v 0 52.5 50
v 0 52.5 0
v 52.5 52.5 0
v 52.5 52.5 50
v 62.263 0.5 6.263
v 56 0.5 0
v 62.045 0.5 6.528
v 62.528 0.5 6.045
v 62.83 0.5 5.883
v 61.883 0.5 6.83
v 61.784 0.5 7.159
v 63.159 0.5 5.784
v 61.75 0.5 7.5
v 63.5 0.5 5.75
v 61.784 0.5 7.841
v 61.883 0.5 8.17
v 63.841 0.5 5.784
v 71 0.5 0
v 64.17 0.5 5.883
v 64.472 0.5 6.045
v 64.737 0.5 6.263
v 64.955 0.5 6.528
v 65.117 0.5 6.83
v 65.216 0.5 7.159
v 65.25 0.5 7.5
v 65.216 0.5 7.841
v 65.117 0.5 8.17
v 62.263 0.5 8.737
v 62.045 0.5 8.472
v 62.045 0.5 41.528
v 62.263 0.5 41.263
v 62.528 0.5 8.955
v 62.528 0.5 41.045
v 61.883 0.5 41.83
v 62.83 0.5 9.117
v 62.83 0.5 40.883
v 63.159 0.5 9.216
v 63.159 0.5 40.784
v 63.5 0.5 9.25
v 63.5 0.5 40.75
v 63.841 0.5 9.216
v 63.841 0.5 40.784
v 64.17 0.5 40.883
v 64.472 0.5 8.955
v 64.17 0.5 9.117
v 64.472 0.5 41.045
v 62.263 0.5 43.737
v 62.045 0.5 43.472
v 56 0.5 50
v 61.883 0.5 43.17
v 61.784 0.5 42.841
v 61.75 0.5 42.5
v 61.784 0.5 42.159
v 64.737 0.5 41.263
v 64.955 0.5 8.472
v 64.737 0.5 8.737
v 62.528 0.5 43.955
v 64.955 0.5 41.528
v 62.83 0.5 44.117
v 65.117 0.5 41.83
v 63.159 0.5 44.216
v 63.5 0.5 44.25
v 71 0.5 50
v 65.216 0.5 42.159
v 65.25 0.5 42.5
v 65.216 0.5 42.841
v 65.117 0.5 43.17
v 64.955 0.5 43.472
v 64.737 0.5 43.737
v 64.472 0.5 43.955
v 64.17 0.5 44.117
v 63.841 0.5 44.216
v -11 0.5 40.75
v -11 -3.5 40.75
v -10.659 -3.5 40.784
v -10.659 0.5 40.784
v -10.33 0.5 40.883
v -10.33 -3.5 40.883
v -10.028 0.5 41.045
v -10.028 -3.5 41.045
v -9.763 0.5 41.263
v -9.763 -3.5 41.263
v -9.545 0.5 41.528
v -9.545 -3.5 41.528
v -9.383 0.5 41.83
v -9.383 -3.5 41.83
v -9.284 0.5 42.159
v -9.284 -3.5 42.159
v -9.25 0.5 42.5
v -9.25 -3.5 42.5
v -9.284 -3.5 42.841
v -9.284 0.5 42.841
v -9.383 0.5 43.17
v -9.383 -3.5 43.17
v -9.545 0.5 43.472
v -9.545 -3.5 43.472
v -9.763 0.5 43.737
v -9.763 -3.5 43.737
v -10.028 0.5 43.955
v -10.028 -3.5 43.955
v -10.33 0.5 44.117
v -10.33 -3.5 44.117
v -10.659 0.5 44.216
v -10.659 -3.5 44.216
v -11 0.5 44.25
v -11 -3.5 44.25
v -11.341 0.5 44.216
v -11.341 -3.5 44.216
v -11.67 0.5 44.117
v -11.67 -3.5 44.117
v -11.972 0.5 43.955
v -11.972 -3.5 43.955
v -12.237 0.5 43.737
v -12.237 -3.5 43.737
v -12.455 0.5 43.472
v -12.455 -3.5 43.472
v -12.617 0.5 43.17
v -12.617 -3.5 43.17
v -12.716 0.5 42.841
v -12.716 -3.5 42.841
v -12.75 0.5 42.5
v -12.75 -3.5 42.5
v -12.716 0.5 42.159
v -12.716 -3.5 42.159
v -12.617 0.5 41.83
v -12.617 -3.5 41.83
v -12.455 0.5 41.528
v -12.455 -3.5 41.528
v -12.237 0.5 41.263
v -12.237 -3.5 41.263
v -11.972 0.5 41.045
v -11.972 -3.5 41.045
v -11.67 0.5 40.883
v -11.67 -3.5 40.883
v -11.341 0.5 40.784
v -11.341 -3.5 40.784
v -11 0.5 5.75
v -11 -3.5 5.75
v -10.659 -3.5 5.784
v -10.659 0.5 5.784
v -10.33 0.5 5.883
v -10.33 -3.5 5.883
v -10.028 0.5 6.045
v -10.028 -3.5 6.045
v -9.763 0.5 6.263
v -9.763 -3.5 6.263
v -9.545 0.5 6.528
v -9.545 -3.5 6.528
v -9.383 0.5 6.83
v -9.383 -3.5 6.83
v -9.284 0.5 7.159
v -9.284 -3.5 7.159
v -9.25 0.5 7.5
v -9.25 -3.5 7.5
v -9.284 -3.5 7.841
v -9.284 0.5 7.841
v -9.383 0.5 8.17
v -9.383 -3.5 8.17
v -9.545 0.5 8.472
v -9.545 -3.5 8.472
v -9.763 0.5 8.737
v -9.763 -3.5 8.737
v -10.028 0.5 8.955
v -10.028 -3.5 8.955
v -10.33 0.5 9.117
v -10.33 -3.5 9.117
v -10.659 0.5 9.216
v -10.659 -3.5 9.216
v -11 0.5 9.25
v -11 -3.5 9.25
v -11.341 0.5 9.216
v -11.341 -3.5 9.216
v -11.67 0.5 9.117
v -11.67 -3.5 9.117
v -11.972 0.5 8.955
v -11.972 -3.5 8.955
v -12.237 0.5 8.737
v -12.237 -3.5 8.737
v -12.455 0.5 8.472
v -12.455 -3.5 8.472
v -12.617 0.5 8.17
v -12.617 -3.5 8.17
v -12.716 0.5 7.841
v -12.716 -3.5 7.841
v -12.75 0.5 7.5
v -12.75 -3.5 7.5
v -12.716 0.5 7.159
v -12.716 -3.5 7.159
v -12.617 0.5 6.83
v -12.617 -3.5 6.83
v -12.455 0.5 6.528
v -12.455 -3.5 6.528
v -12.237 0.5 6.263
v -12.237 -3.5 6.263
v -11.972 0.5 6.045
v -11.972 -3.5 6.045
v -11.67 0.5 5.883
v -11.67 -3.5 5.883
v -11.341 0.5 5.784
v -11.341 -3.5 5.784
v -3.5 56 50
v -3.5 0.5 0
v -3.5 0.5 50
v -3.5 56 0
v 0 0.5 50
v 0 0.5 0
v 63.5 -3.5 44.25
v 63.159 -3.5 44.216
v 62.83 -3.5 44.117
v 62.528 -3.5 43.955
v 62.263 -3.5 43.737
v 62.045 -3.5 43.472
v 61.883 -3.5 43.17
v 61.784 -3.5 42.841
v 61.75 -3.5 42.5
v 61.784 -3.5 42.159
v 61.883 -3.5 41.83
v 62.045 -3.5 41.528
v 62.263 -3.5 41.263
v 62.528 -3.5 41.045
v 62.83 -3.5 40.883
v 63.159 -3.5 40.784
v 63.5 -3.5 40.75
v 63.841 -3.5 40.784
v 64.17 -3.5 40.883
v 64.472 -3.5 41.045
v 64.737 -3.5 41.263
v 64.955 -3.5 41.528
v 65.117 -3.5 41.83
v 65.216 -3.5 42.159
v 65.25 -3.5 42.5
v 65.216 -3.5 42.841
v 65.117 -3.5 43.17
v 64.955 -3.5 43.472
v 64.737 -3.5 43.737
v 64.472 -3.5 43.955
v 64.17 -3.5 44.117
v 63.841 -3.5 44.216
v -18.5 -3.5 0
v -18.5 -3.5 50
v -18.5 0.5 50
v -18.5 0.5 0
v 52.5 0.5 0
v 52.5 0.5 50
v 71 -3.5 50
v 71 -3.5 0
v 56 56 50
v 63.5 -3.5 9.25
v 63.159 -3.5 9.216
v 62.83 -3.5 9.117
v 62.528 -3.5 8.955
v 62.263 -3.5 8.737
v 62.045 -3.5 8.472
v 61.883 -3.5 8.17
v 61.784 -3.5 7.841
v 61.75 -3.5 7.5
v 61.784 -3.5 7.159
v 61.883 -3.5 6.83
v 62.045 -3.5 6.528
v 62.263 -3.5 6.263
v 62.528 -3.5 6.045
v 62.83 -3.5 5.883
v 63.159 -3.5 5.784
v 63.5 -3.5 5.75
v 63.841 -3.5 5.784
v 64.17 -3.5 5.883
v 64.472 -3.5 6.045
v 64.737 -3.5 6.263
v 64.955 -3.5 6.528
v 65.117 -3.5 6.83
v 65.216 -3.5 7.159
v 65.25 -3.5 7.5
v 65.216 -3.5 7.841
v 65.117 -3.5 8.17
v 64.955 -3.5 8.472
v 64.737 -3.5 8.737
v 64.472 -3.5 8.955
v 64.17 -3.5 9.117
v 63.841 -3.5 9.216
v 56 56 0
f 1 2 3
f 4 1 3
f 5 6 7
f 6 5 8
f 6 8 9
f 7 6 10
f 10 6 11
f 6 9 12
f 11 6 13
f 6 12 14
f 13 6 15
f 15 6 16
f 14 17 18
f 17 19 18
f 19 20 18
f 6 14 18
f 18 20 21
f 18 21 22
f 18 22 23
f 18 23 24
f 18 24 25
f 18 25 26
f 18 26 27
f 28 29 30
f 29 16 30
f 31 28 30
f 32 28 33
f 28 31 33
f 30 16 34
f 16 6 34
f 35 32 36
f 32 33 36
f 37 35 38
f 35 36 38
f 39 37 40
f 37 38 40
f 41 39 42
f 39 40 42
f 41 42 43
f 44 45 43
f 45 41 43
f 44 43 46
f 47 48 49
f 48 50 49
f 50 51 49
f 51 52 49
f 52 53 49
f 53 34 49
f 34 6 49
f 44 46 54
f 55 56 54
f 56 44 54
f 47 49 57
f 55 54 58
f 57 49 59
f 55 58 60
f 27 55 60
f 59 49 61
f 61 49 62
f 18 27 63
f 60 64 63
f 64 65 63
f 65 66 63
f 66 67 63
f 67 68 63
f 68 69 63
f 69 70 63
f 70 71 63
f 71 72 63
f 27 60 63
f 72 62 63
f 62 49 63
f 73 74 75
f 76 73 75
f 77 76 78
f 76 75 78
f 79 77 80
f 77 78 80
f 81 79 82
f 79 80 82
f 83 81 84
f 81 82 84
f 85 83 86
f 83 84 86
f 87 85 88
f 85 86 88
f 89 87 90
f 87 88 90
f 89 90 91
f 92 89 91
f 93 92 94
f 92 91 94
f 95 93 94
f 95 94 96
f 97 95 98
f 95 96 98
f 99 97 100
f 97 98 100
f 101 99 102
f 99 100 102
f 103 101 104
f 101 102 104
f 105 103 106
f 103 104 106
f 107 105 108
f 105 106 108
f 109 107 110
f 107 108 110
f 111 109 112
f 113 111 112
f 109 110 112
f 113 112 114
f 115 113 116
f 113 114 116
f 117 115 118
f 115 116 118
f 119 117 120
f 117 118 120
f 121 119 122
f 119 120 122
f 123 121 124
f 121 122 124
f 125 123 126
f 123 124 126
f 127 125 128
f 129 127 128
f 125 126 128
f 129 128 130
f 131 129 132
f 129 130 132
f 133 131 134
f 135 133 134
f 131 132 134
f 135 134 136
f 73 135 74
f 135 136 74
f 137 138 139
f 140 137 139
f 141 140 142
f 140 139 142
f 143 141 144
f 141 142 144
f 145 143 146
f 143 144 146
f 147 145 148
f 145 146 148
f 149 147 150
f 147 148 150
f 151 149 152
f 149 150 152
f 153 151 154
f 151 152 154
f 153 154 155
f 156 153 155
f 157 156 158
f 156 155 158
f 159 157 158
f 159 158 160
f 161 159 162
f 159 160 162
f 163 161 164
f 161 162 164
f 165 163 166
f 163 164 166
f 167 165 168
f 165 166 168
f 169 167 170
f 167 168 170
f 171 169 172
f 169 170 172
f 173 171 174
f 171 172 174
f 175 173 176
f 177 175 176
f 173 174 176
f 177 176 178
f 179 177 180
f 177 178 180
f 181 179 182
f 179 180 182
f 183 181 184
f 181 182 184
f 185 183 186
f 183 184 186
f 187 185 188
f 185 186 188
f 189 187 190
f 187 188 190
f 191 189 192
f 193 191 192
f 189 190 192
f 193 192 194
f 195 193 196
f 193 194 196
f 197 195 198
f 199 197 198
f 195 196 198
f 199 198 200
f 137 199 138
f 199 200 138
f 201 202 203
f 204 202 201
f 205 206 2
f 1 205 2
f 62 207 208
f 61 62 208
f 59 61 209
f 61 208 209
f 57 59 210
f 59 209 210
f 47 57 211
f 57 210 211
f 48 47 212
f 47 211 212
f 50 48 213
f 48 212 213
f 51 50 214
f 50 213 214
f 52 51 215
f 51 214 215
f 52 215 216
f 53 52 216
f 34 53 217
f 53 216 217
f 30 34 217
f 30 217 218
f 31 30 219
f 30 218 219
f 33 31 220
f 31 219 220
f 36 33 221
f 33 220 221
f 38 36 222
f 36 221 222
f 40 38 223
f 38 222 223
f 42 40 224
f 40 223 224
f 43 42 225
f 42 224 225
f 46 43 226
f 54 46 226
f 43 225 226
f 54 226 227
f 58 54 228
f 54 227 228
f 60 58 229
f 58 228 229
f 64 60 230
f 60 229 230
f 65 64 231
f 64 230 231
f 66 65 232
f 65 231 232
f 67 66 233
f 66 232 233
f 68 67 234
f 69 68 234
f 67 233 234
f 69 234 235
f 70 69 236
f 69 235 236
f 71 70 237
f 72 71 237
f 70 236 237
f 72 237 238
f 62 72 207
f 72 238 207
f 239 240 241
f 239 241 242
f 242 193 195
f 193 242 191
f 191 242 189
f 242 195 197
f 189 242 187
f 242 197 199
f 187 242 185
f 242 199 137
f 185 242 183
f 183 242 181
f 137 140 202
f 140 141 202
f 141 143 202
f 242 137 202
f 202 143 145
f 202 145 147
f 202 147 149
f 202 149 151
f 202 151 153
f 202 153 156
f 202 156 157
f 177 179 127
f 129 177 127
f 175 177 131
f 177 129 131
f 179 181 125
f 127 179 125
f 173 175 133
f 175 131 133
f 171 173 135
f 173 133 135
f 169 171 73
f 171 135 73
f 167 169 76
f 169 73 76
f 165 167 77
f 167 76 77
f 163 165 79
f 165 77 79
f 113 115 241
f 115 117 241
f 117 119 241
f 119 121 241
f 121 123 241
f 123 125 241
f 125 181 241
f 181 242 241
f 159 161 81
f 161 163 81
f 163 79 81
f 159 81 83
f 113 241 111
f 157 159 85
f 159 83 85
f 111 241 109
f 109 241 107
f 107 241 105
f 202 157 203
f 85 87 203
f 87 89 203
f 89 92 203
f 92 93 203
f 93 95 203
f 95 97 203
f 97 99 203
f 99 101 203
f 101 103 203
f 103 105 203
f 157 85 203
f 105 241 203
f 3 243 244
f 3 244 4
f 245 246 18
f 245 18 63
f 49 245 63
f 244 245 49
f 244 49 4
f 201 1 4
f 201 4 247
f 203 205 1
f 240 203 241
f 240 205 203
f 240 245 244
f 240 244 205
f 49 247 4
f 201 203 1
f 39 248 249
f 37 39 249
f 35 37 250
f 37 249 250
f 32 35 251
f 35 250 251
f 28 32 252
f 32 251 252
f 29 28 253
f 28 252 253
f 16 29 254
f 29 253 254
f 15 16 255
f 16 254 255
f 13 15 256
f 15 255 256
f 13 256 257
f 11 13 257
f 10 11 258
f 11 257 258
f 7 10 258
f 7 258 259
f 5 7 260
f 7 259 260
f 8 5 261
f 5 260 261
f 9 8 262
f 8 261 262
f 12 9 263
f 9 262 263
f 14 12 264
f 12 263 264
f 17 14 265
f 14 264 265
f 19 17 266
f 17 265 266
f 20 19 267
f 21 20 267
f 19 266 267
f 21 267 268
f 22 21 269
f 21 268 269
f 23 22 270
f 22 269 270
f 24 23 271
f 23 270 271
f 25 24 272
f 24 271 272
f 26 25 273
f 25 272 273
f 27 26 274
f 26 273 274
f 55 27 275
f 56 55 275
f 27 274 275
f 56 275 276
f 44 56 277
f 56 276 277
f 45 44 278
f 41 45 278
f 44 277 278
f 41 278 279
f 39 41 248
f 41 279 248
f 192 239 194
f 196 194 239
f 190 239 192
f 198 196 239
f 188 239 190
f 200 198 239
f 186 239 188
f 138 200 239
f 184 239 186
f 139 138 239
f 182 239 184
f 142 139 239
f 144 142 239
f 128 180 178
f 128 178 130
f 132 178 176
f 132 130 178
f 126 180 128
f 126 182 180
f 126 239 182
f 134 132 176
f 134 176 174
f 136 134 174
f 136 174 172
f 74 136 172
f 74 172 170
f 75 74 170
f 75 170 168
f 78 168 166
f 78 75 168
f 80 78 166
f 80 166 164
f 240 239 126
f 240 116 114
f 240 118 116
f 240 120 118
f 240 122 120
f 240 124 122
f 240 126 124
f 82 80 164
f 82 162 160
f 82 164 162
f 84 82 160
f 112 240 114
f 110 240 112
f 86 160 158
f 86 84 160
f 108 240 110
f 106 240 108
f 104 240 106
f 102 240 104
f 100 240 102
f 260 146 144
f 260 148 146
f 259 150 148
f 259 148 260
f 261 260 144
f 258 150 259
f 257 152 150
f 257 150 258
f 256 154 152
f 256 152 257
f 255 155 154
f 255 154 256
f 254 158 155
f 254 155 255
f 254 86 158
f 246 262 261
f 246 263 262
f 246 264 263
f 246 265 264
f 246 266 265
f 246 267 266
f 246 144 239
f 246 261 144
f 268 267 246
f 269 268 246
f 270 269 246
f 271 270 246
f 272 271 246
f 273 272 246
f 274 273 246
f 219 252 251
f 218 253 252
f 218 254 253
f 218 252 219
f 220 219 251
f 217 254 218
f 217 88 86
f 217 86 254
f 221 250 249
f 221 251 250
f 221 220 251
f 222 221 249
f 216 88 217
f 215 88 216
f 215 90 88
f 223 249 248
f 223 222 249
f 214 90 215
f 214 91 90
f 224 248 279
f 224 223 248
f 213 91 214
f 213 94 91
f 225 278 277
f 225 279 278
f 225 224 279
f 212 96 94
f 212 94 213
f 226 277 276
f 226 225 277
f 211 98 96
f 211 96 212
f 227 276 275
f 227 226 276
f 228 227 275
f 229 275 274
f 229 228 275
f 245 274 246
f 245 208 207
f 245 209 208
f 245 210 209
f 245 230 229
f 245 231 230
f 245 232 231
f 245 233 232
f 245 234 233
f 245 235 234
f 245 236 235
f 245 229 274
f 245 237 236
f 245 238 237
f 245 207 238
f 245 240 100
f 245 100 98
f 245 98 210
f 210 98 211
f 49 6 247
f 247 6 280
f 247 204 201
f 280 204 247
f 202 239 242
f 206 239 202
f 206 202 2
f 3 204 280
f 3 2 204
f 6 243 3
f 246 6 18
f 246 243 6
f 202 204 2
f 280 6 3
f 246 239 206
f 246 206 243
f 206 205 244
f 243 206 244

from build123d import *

# Parameters (mm, degrees)
SKETCH5_W           = 59.5
SKETCH5_H           = 59.5
SKETCH5_W_2         = 52.5
SKETCH5_H_2         = 52.5
BOSS_EXTRUDE5_DEPTH = 50
SKETCH7_R           = 1.75
BOSS_EXTRUDE7_DEPTH = 4


with BuildPart() as part:
    # Sketch5 → Boss-Extrude5 (new body)
    with BuildSketch(Plane.XY):
        with Locations((26.25, 26.25)):
            Rectangle(SKETCH5_W, SKETCH5_H)
        with Locations((26.25, 26.25)):
            Rectangle(SKETCH5_W_2, SKETCH5_H_2, mode=Mode.SUBTRACT)
    extrude(amount=BOSS_EXTRUDE5_DEPTH)

    # Sketch7 → Boss-Extrude7 (add)
    with BuildSketch(Plane.XZ.offset(3.5)):
        Polygon((-3.5, 50), (-18.5, 50), (-18.5, 0), (71, 0), (71, 50), (56, 50), align=None)
        with Locations(Location((-11, 42.5, 0), (0, 0, 270))):
            Circle(SKETCH7_R, mode=Mode.SUBTRACT)
        with Locations(Location((-11, 7.5, 0), (0, 0, 270))):
            Circle(SKETCH7_R, mode=Mode.SUBTRACT)
        with Locations(Location((63.5, 7.5, 0), (0, 0, 90))):
            Circle(SKETCH7_R, mode=Mode.SUBTRACT)
        with Locations(Location((63.5, 42.5, 0), (0, 0, 90))):
            Circle(SKETCH7_R, mode=Mode.SUBTRACT)
    extrude(amount=-BOSS_EXTRUDE7_DEPTH)


solid = part.part
